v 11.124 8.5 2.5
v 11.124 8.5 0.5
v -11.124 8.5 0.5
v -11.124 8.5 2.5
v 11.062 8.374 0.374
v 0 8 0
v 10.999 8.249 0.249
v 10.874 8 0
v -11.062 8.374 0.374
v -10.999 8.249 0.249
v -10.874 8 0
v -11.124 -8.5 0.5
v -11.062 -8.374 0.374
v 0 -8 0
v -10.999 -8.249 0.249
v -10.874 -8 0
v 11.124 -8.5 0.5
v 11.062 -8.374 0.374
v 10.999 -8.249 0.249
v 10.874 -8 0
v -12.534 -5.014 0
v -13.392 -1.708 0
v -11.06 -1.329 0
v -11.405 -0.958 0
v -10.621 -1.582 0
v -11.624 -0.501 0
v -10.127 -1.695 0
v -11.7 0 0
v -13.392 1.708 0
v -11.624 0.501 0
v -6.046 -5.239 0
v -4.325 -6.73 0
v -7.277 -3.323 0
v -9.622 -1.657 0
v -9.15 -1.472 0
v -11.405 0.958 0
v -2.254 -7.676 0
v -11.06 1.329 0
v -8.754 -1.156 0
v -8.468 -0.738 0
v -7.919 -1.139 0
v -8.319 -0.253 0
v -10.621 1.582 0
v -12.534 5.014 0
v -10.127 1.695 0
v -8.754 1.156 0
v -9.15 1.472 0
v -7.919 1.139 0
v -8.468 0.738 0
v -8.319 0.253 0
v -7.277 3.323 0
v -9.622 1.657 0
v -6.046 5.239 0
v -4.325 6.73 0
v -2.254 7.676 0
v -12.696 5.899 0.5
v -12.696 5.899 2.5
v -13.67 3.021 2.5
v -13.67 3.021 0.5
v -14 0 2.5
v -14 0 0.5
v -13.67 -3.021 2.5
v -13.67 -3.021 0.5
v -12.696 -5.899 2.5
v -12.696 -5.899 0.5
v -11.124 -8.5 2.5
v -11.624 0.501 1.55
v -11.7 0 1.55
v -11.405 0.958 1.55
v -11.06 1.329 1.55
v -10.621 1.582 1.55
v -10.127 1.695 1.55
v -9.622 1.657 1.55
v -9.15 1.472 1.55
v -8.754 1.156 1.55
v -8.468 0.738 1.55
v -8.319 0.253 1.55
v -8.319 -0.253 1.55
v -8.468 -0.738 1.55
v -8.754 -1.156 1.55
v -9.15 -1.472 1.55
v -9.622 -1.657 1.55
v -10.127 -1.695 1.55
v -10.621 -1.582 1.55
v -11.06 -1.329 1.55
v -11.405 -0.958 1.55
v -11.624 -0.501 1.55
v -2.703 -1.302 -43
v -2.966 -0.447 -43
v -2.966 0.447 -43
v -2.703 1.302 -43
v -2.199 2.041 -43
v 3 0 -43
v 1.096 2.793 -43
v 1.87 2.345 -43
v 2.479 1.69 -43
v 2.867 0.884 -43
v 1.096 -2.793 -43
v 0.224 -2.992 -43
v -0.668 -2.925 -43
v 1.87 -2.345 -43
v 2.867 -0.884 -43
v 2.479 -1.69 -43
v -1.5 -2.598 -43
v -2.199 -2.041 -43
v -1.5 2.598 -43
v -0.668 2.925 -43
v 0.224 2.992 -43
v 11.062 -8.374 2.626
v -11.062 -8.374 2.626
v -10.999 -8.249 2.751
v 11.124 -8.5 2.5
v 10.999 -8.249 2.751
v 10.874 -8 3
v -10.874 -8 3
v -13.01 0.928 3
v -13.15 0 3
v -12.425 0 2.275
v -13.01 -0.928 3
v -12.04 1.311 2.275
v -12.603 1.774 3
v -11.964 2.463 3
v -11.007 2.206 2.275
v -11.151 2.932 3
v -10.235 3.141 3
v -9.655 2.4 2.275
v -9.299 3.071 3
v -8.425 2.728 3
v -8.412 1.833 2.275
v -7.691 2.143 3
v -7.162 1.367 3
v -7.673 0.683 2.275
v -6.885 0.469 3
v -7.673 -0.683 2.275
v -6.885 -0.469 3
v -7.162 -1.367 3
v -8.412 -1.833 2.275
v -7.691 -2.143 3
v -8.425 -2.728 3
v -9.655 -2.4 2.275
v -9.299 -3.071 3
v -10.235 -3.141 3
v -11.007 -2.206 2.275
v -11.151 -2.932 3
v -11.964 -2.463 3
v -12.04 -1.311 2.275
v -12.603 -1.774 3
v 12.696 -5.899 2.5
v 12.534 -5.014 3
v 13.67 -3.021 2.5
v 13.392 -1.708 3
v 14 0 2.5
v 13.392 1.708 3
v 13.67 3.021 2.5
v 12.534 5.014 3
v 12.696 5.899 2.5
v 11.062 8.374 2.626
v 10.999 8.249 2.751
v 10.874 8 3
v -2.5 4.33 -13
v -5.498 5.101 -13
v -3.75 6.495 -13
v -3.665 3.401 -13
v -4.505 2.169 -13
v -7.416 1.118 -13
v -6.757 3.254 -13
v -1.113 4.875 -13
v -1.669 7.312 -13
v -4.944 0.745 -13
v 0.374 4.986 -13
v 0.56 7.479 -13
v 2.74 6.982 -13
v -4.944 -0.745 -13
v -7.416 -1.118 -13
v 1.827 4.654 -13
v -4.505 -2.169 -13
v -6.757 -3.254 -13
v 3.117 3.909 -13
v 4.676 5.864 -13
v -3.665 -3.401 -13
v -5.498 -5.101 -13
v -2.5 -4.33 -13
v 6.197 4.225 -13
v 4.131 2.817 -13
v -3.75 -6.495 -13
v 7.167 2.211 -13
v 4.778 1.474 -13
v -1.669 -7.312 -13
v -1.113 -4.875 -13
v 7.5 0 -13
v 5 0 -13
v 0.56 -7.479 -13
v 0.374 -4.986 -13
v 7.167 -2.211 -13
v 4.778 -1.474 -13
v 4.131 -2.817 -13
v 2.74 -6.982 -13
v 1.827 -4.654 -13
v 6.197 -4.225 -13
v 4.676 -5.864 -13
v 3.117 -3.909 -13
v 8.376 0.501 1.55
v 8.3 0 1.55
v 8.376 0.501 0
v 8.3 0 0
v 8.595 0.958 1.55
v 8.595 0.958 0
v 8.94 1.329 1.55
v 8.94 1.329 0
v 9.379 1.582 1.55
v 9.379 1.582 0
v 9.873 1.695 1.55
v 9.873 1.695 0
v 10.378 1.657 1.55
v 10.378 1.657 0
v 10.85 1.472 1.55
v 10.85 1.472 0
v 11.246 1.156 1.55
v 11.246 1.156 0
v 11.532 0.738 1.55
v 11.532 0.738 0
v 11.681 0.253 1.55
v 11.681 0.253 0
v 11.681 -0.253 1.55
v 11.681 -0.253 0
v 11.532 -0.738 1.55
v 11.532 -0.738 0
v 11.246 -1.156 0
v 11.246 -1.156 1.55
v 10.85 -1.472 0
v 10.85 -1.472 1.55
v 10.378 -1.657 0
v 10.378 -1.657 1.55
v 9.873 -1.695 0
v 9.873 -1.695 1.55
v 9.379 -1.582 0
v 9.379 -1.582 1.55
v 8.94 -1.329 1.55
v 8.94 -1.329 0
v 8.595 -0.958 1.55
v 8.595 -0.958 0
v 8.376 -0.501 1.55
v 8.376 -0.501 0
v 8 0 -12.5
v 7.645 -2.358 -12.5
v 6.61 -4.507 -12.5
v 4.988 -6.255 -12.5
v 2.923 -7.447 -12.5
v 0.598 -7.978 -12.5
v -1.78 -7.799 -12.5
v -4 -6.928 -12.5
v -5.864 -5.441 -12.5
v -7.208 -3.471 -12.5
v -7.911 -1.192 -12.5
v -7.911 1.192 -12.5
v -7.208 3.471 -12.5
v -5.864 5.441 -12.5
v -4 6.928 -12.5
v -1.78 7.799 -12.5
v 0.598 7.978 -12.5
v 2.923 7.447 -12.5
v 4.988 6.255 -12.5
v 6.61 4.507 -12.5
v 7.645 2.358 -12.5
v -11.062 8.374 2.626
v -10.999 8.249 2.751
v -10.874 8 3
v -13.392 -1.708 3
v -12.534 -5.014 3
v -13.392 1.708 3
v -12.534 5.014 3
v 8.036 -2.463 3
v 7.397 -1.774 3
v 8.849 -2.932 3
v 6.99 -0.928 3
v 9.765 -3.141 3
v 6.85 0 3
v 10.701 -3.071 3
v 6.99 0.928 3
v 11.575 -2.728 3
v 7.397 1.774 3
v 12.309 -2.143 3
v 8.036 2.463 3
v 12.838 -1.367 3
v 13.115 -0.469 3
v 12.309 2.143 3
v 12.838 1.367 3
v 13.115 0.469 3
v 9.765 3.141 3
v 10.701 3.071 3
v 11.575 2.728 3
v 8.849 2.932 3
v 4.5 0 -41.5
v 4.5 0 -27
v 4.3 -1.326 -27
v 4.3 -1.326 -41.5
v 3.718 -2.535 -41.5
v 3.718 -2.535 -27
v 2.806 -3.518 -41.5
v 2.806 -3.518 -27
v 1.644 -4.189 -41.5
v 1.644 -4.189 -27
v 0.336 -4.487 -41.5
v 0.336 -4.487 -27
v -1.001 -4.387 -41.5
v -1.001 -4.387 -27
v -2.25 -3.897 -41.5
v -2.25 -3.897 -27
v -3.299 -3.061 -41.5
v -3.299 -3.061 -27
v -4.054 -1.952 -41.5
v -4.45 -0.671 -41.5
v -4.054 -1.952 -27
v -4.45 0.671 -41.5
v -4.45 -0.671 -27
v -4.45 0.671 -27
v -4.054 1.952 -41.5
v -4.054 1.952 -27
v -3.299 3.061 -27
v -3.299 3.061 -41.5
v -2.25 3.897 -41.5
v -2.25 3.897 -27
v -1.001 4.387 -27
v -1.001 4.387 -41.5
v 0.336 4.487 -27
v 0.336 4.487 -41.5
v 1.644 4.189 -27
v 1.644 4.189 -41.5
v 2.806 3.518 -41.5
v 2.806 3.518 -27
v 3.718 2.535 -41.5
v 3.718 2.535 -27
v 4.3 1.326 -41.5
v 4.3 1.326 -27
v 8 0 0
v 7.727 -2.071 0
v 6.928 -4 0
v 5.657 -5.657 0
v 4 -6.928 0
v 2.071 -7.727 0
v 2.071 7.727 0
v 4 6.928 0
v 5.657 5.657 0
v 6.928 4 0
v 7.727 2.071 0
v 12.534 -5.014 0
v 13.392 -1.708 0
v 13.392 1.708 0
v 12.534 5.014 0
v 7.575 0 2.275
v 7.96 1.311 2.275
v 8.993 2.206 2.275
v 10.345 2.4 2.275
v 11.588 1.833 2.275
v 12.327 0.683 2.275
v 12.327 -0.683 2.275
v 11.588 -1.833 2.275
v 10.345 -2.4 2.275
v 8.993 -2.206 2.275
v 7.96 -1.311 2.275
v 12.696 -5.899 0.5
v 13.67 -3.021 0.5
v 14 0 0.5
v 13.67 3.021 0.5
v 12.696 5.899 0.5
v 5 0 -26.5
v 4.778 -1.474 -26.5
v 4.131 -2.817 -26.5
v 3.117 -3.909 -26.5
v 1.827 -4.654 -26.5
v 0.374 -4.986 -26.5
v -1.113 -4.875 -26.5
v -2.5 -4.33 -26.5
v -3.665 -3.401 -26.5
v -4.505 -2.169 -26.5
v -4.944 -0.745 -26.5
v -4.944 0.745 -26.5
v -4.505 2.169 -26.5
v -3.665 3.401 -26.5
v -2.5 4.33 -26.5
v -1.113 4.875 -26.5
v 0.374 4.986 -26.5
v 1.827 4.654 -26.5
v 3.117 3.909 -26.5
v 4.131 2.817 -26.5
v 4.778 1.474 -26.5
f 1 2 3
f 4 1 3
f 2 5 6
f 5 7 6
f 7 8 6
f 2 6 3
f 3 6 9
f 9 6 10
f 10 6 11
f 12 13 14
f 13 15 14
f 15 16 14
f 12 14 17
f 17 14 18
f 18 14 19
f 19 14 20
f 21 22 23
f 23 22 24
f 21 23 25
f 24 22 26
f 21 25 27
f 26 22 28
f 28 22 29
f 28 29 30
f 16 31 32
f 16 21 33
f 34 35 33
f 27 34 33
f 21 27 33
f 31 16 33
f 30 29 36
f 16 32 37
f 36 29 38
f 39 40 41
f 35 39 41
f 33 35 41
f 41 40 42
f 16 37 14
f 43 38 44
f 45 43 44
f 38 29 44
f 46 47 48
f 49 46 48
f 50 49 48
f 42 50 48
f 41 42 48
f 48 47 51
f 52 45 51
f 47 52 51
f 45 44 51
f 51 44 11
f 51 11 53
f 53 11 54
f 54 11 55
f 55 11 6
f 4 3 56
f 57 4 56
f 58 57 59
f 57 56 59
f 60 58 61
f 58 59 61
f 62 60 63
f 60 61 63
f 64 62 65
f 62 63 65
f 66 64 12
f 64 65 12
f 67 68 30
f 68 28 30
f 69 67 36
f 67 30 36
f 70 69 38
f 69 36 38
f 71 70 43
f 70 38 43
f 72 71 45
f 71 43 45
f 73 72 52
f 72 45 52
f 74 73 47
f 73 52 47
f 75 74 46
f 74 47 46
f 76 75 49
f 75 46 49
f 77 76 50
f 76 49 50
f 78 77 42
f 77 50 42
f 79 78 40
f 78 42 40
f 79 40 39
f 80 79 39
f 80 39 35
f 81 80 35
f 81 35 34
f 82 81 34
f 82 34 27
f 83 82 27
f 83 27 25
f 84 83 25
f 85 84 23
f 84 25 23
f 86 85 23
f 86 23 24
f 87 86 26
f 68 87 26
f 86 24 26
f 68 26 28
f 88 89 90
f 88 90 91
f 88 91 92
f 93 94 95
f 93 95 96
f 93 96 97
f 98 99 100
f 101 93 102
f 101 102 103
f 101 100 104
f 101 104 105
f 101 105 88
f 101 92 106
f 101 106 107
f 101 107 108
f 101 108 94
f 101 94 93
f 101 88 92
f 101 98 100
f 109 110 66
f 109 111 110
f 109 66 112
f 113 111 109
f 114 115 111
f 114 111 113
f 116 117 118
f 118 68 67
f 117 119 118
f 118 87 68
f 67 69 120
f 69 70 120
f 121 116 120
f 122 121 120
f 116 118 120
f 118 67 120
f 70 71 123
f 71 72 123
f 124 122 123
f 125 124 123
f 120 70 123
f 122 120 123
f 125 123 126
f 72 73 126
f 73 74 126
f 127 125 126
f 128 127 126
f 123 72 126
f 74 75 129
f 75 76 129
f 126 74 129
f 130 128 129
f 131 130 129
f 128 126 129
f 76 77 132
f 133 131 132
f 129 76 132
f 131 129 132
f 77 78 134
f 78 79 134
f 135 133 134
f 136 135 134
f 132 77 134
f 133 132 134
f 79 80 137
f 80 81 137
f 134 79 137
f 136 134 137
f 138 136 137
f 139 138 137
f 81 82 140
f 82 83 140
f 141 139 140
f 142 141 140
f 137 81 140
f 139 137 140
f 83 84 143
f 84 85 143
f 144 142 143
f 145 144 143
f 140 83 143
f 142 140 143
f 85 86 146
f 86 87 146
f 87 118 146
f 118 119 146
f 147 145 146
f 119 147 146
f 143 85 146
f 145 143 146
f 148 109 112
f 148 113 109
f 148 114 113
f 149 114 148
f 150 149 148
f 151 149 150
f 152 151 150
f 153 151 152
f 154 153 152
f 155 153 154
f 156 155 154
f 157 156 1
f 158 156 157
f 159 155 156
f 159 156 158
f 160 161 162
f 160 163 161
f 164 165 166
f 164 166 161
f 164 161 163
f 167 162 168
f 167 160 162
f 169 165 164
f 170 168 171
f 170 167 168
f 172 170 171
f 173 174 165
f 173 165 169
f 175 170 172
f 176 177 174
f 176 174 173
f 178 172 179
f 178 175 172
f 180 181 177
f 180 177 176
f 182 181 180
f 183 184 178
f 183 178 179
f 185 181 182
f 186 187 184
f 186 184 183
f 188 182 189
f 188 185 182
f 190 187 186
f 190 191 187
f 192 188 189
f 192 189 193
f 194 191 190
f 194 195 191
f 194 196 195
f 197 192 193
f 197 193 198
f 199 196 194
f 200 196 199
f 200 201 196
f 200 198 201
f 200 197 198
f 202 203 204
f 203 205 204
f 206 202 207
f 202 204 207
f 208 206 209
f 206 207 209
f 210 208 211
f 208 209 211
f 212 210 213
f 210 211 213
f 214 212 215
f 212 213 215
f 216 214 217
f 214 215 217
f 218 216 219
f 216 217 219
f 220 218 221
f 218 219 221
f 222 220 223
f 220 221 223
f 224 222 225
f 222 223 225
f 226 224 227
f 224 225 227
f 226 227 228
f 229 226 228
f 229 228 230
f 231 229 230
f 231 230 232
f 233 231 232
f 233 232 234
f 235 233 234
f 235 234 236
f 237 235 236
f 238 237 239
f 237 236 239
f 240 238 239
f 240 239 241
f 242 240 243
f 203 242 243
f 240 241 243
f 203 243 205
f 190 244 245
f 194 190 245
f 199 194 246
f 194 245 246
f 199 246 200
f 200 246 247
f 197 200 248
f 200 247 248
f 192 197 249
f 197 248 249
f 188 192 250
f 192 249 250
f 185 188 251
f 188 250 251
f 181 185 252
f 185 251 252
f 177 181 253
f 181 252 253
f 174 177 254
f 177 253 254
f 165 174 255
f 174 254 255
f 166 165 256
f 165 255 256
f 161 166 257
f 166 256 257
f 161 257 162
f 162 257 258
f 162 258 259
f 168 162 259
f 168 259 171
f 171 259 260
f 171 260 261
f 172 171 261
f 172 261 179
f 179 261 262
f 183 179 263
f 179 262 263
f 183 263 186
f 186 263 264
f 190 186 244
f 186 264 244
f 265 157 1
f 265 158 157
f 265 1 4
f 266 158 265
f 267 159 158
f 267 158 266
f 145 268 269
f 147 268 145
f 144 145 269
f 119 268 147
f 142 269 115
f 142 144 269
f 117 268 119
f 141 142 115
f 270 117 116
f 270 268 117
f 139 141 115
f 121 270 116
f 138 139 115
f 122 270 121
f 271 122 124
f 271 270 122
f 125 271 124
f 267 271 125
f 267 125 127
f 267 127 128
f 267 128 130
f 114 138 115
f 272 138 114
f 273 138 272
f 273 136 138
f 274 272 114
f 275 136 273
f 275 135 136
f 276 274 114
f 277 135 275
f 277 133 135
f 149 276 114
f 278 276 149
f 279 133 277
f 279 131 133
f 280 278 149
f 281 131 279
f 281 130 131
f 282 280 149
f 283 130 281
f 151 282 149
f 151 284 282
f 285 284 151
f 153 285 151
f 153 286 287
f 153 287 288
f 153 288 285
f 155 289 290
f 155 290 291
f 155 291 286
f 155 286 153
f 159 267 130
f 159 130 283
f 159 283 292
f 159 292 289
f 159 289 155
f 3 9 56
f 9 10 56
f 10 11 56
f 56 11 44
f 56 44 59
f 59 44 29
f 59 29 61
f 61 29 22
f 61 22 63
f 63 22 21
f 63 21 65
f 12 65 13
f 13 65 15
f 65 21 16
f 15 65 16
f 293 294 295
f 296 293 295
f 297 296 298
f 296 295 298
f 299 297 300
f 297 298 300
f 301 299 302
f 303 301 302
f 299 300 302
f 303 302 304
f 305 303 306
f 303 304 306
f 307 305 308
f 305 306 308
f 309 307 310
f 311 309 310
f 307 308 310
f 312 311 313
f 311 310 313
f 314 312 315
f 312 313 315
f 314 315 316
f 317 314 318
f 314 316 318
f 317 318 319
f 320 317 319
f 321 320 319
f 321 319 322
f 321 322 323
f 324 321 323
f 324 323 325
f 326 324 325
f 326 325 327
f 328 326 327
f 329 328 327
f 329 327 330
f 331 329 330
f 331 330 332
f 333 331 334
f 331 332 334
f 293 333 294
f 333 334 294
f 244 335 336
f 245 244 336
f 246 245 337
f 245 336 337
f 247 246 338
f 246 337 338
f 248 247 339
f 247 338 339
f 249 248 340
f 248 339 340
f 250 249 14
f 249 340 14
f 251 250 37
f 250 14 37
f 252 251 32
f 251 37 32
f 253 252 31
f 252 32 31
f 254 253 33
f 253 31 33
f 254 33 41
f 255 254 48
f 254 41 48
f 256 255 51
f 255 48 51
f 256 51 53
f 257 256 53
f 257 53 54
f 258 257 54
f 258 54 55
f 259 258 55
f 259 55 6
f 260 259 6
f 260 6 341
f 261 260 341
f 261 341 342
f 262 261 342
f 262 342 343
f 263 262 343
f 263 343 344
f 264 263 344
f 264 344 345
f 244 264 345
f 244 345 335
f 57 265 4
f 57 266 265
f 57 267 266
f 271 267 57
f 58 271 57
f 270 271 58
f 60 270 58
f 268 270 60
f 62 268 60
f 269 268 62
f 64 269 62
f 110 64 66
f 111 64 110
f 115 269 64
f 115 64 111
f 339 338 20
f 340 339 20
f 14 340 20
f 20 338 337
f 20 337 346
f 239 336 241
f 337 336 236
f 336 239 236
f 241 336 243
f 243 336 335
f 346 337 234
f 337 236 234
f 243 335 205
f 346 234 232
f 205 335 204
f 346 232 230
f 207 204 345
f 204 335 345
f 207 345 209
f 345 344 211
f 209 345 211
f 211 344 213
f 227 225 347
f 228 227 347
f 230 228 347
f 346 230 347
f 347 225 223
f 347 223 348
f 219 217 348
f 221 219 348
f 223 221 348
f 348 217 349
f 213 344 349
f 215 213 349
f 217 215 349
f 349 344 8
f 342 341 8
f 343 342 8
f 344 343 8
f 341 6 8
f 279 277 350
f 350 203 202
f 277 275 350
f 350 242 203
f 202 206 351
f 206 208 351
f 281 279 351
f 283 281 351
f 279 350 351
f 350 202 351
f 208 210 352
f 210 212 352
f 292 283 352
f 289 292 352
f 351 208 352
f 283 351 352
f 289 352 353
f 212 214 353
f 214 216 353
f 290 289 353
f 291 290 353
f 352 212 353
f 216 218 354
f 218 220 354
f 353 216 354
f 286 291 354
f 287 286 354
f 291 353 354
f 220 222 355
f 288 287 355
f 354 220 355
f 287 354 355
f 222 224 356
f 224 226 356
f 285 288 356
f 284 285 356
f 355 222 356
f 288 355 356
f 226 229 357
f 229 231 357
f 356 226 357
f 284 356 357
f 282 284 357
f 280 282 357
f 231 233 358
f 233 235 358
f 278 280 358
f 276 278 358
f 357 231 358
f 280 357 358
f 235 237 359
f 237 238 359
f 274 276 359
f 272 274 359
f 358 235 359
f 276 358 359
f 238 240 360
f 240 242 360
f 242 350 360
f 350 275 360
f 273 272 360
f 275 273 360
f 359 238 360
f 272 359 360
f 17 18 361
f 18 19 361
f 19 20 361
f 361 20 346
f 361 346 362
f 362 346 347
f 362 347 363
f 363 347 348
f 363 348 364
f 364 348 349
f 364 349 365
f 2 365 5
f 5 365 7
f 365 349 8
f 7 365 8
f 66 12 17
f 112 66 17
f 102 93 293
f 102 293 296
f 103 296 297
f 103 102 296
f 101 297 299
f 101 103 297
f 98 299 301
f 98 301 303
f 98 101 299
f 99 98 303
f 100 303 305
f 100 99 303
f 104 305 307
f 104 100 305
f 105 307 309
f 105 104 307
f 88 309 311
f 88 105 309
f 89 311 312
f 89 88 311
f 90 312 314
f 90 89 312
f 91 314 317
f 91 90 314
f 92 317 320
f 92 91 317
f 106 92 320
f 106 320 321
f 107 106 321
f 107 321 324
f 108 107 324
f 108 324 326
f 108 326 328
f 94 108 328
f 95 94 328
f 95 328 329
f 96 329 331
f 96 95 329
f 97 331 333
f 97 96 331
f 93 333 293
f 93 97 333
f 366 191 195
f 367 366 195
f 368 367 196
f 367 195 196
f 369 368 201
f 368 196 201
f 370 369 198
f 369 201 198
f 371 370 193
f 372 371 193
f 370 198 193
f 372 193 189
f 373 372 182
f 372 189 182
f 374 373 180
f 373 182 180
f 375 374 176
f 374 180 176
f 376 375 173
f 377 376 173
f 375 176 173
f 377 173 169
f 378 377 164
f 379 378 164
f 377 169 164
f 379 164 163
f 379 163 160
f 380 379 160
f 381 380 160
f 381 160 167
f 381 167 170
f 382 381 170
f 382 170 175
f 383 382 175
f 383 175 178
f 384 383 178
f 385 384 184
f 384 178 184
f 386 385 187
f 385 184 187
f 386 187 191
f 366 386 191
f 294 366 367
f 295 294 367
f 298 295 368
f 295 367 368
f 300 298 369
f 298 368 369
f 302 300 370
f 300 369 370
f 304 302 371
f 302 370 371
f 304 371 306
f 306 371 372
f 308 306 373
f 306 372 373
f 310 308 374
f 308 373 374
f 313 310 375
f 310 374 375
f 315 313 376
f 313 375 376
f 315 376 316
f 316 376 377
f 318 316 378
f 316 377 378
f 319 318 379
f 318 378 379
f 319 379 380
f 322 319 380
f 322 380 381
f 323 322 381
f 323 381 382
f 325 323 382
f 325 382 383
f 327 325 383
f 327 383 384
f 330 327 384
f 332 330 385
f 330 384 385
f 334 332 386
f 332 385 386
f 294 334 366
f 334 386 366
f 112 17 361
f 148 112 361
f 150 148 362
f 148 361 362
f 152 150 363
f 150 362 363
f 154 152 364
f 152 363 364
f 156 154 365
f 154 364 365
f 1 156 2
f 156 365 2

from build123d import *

# Parameters (mm, degrees)
F1_DEPTH       = 3
F2_SIZE        = 0.5
F4_D           = 3.4
F4_CSINK_D     = 6.3
F4_CSINK_ANGLE = 90
F5_R           = 8
F6_DEPTH       = 13
F7_R           = 5
F8_DEPTH       = 14
F9_R           = 4.5
F10_DEPTH      = 16
F11_SIZE       = 1.5
F12_SIZE       = 0.49999


# Not quite as in the source:
# - a fillet or chamfer is up to 0.001 mm smaller than in the source, because OpenCascade refuses the exact size


with BuildPart() as f1:
    # F0 (on Top) → F1 (new body)
    with BuildSketch(Plane.XY):
        with BuildLine():
            Line((11.1242977306, 8.5), (-11.1242977306, 8.5))
            ThreePointArc((-11.1242977306, 8.5), (-14, 0), (-11.1242977306, -8.5))
            Line((-11.1242977306, -8.5), (11.1242977306, -8.5))
            ThreePointArc((11.1242977306, -8.5), (14, 0), (11.1242977306, 8.5))
        make_face()
    extrude(amount=F1_DEPTH)

    # F2
    f2_edges = [f1.edges().sort_by_distance(p)[0] for p in [
        (0, -8.5, 3),
        (14, 0, 3),
        (0, 8.5, 3),
        (-14, 0, 3),
        (0, -8.5, 0),
        (14, 0, 0),
        (0, 8.5, 0),
        (-14, 0, 0),
    ]]
    chamfer(f2_edges, length=F2_SIZE)

    # F4 (through all)
    with Locations(Plane.XY.offset(3)):
        with Locations((-10, 0), (10, 0)):
            CounterSinkHole(F4_D / 2, F4_CSINK_D / 2, counter_sink_angle=F4_CSINK_ANGLE)

    # F5 (on face) → F6 (join)
    with BuildSketch(Plane(origin=(0, 0, 0), x_dir=(1, 0, 0), z_dir=(0, 0, -1))):
        Circle(F5_R)
    extrude(amount=F6_DEPTH)

    # F7 (on face) → F8 (join)
    with BuildSketch(Plane(origin=(0, 0, -13), x_dir=(1, 0, 0), z_dir=(0, 0, -1))):
        Circle(F7_R)
    extrude(amount=F8_DEPTH)

    # F9 (on face) → F10 (join)
    with BuildSketch(Plane(origin=(0, 0, -27), x_dir=(1, 0, 0), z_dir=(0, 0, -1))):
        Circle(F9_R)
    extrude(amount=F10_DEPTH)

    # F11
    f11_edges = [f1.edges().sort_by_distance(p)[0] for p in [
        (-4.5, 0, -43),
    ]]
    chamfer(f11_edges, length=F11_SIZE)

    # F12 (size 0.5 in the source; OpenCascade refuses exactly that, so slightly less here)
    f12_edges = [f1.edges().sort_by_distance(p)[0] for p in [
        (-5, 0, -27),
        (-8, 0, -13),
    ]]
    chamfer(f12_edges, length=F12_SIZE)


solid = f1.part
